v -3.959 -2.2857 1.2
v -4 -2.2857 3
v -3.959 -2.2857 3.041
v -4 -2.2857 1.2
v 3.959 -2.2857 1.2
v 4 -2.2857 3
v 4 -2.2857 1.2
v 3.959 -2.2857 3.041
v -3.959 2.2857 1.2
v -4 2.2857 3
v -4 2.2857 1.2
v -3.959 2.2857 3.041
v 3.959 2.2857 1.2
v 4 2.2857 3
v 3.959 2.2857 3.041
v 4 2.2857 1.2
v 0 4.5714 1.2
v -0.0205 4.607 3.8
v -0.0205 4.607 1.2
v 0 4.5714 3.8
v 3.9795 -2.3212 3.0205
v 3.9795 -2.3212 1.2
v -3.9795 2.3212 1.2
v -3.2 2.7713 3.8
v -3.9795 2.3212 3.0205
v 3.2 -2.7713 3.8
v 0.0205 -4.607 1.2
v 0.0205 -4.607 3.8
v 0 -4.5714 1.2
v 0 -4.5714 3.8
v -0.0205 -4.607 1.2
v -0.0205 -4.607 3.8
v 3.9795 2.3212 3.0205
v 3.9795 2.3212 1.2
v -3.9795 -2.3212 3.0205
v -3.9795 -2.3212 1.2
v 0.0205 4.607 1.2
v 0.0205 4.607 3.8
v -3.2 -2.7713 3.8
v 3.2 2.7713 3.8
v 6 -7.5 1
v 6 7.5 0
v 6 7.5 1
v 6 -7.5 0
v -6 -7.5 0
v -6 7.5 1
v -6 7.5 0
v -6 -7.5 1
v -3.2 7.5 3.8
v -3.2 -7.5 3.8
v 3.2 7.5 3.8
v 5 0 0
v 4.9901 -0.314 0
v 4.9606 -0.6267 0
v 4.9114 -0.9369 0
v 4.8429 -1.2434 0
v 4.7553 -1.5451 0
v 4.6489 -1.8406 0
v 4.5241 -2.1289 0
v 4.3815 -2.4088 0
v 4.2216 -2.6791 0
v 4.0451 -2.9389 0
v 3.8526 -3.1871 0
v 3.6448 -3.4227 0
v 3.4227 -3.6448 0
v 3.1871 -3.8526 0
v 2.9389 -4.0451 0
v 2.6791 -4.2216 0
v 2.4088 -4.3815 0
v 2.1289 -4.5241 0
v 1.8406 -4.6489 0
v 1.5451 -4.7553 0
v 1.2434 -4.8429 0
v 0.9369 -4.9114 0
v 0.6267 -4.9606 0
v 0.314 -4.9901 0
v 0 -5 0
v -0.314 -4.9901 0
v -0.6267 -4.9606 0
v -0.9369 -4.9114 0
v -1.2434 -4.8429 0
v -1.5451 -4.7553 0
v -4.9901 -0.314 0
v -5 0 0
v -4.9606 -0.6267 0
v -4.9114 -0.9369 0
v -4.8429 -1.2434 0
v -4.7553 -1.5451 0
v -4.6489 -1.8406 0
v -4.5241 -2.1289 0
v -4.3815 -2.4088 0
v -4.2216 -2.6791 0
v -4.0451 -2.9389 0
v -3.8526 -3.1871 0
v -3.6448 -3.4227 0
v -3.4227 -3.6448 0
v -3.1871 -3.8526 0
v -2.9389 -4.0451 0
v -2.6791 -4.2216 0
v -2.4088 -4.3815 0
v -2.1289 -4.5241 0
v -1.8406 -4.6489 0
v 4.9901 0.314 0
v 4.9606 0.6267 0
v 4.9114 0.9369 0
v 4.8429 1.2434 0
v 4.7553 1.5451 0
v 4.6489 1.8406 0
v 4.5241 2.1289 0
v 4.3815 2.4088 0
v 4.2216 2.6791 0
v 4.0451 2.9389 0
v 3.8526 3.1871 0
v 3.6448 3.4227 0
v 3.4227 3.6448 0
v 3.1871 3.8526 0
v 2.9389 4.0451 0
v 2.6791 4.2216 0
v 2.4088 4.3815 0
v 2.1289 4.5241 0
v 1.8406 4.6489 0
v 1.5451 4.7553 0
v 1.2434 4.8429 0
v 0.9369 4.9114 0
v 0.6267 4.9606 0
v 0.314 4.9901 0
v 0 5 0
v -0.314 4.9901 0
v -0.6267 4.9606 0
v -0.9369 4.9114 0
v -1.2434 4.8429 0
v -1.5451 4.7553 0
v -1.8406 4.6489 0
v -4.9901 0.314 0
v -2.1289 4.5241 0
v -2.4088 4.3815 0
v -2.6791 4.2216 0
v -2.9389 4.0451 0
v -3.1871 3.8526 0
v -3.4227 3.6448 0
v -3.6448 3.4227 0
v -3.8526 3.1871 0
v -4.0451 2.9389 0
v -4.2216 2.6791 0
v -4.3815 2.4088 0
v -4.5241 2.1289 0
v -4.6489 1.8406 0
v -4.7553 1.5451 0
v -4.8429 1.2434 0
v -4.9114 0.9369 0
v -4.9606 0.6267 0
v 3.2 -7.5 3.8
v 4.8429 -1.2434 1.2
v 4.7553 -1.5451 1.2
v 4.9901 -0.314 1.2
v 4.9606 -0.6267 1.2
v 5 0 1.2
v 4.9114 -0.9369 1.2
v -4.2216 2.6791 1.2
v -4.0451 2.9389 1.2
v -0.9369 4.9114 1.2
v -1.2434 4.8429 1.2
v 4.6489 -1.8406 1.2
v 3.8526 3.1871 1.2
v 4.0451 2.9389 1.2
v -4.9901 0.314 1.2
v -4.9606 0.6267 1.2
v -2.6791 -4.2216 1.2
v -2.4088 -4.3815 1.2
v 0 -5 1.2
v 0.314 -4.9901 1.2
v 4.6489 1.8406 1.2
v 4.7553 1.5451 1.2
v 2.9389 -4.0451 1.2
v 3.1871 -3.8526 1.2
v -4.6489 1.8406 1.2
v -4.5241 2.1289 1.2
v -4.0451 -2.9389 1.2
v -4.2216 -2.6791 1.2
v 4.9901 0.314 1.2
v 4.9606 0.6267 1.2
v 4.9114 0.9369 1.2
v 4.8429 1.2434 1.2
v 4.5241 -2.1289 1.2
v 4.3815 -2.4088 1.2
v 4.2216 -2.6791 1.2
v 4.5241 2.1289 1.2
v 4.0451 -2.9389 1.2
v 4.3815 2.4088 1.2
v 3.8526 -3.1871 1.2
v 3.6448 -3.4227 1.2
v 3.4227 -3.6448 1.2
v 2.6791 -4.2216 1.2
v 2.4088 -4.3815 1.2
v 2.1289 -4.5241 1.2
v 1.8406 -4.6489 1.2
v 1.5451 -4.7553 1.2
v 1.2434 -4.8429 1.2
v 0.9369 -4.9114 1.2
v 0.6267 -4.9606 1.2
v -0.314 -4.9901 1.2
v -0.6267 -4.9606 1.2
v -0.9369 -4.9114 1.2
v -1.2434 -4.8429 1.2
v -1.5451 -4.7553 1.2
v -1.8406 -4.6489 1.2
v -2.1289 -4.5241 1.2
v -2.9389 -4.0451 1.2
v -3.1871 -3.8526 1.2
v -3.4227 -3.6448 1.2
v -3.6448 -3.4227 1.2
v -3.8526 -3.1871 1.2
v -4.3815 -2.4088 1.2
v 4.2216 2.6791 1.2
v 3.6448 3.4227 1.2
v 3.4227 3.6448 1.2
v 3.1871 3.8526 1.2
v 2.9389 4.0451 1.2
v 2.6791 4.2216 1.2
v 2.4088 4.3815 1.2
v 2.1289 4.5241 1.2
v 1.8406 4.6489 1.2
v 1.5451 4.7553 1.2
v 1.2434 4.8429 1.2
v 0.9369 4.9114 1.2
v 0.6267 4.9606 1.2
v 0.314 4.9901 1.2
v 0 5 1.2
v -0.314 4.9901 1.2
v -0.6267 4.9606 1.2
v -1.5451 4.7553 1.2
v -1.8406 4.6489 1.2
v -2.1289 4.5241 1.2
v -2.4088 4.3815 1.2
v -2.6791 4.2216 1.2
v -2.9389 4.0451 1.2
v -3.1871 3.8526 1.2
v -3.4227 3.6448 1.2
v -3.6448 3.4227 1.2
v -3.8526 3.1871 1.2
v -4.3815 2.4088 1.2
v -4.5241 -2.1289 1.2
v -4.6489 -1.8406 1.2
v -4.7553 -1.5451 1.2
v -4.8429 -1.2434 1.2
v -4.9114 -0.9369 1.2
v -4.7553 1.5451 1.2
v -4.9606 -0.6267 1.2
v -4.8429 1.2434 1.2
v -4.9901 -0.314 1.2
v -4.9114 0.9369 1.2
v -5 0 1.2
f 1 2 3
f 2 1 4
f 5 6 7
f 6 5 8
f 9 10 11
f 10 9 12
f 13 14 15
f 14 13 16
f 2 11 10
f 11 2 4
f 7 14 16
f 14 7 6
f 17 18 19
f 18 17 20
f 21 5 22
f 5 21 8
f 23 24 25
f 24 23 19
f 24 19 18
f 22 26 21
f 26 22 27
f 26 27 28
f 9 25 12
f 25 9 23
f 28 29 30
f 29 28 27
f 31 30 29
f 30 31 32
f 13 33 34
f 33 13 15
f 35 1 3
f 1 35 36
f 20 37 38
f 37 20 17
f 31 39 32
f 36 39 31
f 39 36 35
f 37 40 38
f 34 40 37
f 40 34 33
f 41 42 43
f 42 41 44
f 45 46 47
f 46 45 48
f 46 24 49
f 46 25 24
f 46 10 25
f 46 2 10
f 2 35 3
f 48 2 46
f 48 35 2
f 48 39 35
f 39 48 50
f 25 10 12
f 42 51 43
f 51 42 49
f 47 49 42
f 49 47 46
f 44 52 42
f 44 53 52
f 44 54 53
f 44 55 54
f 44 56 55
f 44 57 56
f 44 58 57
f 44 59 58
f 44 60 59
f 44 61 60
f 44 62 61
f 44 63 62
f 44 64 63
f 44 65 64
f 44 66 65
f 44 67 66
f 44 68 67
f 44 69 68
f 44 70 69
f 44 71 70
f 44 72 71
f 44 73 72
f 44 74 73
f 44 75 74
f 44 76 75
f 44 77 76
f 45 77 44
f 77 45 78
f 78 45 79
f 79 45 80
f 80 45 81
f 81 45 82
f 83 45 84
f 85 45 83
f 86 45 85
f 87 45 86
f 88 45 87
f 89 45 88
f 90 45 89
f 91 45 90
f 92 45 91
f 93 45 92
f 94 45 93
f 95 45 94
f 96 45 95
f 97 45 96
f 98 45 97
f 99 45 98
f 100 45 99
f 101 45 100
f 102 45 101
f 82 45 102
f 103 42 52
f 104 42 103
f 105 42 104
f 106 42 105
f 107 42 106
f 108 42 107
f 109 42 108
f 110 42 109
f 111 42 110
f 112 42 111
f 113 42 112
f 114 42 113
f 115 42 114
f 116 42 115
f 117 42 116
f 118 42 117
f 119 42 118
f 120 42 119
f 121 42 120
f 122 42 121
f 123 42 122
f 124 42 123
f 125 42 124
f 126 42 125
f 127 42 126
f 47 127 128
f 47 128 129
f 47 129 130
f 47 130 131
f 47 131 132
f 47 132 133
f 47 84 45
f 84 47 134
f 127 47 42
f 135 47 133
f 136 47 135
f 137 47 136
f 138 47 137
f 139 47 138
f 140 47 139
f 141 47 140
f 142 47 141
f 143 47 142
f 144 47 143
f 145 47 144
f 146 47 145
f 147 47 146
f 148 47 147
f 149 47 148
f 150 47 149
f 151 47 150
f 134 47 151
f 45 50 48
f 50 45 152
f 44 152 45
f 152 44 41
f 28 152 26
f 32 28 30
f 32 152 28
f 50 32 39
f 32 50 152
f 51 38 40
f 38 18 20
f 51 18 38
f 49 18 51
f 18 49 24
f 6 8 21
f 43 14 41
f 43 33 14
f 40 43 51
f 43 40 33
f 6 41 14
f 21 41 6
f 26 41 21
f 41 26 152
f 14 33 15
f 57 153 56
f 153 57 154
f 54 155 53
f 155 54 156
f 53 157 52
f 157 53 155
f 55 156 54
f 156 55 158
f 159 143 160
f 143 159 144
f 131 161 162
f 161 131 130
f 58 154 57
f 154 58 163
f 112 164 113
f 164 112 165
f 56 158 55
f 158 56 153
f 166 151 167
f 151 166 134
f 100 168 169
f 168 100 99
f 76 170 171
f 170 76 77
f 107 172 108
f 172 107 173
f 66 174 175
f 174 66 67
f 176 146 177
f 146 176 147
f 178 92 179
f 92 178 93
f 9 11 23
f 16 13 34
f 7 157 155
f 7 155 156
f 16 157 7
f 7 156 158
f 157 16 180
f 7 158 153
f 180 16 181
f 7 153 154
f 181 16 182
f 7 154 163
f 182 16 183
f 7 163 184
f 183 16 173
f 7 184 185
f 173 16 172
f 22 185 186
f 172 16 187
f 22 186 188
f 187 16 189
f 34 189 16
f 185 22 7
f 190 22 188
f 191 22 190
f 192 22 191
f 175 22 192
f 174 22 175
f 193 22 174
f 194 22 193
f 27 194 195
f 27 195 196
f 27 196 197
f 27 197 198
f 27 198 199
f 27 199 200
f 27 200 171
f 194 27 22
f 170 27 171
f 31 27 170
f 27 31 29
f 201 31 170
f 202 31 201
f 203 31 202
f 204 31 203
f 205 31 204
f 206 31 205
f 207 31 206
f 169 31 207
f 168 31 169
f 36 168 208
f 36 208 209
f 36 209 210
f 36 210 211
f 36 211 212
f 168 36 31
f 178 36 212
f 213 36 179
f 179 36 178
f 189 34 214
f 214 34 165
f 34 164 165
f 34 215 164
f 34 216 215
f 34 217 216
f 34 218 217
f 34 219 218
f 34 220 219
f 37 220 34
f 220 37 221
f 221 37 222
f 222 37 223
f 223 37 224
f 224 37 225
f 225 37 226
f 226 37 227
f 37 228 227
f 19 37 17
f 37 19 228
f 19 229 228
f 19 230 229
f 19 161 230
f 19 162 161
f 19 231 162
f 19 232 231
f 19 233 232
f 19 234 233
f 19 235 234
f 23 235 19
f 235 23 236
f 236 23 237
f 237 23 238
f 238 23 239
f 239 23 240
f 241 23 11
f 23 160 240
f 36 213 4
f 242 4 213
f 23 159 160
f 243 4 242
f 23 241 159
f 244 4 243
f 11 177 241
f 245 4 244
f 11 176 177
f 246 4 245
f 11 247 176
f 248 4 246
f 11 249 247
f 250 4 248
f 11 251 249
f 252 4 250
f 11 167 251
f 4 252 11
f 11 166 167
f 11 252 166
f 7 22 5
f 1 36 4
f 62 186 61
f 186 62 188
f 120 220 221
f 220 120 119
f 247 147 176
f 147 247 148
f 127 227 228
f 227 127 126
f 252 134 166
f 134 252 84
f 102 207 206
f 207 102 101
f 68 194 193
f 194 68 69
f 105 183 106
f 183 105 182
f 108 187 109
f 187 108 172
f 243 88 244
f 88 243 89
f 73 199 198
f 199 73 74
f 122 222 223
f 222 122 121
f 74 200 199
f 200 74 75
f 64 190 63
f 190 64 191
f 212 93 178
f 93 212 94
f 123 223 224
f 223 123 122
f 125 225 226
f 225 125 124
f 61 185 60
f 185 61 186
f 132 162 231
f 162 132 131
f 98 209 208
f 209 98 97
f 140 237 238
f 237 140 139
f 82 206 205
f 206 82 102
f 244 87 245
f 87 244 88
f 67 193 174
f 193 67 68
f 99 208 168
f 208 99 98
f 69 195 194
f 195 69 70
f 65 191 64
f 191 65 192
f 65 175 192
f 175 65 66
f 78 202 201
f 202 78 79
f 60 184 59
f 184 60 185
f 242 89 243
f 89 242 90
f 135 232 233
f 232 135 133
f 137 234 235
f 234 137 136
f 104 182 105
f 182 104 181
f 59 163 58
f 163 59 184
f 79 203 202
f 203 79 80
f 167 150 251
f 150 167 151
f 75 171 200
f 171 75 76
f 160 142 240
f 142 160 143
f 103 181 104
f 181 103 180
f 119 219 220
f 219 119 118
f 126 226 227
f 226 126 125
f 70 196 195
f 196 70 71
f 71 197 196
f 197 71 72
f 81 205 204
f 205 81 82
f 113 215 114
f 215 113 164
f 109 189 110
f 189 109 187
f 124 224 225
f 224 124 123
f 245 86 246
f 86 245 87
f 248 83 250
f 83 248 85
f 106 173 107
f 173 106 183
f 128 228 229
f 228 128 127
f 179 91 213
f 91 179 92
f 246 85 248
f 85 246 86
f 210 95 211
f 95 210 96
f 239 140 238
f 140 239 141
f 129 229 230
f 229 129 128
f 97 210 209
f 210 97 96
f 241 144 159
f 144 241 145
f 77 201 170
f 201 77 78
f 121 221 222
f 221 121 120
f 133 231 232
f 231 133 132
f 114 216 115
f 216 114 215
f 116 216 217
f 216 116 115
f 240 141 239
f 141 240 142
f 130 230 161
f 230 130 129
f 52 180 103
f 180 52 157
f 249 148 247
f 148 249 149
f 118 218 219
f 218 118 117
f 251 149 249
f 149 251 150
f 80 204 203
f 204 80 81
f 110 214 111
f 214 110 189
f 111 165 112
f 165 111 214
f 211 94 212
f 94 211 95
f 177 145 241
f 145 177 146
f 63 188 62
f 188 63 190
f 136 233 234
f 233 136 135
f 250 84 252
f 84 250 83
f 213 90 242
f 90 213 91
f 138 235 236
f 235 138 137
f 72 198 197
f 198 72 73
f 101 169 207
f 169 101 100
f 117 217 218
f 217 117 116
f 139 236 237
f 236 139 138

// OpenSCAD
module box(w,h,d) {
	scale ([w,h,d]) cube(1, true);
}
module hexagon(height, depth) {
	boxWidth=height/1.75;
		union(){
			box(boxWidth, height, depth);
			rotate([0,0,60]) box(boxWidth, height, depth);
			rotate([0,0,-60]) box(boxWidth, height, depth);
		}
}

module nut() {
rotate([180,0,0]) difference() {
	translate([-6, -7.5, 0]) rotate([270,0,0]) linear_extrude(height=15) polygon([ [0,0], [12, 0], [12, 1], [9.2, 3.8], [2.8, 3.8], [0, 1] ]);
	translate([0,0,-1.2]) cylinder(r=5, h=1.2, $fn=100);
	translate([0,0,-4]) rotate([0,0,90]) hexagon(8, 8);
}
}

nut();
